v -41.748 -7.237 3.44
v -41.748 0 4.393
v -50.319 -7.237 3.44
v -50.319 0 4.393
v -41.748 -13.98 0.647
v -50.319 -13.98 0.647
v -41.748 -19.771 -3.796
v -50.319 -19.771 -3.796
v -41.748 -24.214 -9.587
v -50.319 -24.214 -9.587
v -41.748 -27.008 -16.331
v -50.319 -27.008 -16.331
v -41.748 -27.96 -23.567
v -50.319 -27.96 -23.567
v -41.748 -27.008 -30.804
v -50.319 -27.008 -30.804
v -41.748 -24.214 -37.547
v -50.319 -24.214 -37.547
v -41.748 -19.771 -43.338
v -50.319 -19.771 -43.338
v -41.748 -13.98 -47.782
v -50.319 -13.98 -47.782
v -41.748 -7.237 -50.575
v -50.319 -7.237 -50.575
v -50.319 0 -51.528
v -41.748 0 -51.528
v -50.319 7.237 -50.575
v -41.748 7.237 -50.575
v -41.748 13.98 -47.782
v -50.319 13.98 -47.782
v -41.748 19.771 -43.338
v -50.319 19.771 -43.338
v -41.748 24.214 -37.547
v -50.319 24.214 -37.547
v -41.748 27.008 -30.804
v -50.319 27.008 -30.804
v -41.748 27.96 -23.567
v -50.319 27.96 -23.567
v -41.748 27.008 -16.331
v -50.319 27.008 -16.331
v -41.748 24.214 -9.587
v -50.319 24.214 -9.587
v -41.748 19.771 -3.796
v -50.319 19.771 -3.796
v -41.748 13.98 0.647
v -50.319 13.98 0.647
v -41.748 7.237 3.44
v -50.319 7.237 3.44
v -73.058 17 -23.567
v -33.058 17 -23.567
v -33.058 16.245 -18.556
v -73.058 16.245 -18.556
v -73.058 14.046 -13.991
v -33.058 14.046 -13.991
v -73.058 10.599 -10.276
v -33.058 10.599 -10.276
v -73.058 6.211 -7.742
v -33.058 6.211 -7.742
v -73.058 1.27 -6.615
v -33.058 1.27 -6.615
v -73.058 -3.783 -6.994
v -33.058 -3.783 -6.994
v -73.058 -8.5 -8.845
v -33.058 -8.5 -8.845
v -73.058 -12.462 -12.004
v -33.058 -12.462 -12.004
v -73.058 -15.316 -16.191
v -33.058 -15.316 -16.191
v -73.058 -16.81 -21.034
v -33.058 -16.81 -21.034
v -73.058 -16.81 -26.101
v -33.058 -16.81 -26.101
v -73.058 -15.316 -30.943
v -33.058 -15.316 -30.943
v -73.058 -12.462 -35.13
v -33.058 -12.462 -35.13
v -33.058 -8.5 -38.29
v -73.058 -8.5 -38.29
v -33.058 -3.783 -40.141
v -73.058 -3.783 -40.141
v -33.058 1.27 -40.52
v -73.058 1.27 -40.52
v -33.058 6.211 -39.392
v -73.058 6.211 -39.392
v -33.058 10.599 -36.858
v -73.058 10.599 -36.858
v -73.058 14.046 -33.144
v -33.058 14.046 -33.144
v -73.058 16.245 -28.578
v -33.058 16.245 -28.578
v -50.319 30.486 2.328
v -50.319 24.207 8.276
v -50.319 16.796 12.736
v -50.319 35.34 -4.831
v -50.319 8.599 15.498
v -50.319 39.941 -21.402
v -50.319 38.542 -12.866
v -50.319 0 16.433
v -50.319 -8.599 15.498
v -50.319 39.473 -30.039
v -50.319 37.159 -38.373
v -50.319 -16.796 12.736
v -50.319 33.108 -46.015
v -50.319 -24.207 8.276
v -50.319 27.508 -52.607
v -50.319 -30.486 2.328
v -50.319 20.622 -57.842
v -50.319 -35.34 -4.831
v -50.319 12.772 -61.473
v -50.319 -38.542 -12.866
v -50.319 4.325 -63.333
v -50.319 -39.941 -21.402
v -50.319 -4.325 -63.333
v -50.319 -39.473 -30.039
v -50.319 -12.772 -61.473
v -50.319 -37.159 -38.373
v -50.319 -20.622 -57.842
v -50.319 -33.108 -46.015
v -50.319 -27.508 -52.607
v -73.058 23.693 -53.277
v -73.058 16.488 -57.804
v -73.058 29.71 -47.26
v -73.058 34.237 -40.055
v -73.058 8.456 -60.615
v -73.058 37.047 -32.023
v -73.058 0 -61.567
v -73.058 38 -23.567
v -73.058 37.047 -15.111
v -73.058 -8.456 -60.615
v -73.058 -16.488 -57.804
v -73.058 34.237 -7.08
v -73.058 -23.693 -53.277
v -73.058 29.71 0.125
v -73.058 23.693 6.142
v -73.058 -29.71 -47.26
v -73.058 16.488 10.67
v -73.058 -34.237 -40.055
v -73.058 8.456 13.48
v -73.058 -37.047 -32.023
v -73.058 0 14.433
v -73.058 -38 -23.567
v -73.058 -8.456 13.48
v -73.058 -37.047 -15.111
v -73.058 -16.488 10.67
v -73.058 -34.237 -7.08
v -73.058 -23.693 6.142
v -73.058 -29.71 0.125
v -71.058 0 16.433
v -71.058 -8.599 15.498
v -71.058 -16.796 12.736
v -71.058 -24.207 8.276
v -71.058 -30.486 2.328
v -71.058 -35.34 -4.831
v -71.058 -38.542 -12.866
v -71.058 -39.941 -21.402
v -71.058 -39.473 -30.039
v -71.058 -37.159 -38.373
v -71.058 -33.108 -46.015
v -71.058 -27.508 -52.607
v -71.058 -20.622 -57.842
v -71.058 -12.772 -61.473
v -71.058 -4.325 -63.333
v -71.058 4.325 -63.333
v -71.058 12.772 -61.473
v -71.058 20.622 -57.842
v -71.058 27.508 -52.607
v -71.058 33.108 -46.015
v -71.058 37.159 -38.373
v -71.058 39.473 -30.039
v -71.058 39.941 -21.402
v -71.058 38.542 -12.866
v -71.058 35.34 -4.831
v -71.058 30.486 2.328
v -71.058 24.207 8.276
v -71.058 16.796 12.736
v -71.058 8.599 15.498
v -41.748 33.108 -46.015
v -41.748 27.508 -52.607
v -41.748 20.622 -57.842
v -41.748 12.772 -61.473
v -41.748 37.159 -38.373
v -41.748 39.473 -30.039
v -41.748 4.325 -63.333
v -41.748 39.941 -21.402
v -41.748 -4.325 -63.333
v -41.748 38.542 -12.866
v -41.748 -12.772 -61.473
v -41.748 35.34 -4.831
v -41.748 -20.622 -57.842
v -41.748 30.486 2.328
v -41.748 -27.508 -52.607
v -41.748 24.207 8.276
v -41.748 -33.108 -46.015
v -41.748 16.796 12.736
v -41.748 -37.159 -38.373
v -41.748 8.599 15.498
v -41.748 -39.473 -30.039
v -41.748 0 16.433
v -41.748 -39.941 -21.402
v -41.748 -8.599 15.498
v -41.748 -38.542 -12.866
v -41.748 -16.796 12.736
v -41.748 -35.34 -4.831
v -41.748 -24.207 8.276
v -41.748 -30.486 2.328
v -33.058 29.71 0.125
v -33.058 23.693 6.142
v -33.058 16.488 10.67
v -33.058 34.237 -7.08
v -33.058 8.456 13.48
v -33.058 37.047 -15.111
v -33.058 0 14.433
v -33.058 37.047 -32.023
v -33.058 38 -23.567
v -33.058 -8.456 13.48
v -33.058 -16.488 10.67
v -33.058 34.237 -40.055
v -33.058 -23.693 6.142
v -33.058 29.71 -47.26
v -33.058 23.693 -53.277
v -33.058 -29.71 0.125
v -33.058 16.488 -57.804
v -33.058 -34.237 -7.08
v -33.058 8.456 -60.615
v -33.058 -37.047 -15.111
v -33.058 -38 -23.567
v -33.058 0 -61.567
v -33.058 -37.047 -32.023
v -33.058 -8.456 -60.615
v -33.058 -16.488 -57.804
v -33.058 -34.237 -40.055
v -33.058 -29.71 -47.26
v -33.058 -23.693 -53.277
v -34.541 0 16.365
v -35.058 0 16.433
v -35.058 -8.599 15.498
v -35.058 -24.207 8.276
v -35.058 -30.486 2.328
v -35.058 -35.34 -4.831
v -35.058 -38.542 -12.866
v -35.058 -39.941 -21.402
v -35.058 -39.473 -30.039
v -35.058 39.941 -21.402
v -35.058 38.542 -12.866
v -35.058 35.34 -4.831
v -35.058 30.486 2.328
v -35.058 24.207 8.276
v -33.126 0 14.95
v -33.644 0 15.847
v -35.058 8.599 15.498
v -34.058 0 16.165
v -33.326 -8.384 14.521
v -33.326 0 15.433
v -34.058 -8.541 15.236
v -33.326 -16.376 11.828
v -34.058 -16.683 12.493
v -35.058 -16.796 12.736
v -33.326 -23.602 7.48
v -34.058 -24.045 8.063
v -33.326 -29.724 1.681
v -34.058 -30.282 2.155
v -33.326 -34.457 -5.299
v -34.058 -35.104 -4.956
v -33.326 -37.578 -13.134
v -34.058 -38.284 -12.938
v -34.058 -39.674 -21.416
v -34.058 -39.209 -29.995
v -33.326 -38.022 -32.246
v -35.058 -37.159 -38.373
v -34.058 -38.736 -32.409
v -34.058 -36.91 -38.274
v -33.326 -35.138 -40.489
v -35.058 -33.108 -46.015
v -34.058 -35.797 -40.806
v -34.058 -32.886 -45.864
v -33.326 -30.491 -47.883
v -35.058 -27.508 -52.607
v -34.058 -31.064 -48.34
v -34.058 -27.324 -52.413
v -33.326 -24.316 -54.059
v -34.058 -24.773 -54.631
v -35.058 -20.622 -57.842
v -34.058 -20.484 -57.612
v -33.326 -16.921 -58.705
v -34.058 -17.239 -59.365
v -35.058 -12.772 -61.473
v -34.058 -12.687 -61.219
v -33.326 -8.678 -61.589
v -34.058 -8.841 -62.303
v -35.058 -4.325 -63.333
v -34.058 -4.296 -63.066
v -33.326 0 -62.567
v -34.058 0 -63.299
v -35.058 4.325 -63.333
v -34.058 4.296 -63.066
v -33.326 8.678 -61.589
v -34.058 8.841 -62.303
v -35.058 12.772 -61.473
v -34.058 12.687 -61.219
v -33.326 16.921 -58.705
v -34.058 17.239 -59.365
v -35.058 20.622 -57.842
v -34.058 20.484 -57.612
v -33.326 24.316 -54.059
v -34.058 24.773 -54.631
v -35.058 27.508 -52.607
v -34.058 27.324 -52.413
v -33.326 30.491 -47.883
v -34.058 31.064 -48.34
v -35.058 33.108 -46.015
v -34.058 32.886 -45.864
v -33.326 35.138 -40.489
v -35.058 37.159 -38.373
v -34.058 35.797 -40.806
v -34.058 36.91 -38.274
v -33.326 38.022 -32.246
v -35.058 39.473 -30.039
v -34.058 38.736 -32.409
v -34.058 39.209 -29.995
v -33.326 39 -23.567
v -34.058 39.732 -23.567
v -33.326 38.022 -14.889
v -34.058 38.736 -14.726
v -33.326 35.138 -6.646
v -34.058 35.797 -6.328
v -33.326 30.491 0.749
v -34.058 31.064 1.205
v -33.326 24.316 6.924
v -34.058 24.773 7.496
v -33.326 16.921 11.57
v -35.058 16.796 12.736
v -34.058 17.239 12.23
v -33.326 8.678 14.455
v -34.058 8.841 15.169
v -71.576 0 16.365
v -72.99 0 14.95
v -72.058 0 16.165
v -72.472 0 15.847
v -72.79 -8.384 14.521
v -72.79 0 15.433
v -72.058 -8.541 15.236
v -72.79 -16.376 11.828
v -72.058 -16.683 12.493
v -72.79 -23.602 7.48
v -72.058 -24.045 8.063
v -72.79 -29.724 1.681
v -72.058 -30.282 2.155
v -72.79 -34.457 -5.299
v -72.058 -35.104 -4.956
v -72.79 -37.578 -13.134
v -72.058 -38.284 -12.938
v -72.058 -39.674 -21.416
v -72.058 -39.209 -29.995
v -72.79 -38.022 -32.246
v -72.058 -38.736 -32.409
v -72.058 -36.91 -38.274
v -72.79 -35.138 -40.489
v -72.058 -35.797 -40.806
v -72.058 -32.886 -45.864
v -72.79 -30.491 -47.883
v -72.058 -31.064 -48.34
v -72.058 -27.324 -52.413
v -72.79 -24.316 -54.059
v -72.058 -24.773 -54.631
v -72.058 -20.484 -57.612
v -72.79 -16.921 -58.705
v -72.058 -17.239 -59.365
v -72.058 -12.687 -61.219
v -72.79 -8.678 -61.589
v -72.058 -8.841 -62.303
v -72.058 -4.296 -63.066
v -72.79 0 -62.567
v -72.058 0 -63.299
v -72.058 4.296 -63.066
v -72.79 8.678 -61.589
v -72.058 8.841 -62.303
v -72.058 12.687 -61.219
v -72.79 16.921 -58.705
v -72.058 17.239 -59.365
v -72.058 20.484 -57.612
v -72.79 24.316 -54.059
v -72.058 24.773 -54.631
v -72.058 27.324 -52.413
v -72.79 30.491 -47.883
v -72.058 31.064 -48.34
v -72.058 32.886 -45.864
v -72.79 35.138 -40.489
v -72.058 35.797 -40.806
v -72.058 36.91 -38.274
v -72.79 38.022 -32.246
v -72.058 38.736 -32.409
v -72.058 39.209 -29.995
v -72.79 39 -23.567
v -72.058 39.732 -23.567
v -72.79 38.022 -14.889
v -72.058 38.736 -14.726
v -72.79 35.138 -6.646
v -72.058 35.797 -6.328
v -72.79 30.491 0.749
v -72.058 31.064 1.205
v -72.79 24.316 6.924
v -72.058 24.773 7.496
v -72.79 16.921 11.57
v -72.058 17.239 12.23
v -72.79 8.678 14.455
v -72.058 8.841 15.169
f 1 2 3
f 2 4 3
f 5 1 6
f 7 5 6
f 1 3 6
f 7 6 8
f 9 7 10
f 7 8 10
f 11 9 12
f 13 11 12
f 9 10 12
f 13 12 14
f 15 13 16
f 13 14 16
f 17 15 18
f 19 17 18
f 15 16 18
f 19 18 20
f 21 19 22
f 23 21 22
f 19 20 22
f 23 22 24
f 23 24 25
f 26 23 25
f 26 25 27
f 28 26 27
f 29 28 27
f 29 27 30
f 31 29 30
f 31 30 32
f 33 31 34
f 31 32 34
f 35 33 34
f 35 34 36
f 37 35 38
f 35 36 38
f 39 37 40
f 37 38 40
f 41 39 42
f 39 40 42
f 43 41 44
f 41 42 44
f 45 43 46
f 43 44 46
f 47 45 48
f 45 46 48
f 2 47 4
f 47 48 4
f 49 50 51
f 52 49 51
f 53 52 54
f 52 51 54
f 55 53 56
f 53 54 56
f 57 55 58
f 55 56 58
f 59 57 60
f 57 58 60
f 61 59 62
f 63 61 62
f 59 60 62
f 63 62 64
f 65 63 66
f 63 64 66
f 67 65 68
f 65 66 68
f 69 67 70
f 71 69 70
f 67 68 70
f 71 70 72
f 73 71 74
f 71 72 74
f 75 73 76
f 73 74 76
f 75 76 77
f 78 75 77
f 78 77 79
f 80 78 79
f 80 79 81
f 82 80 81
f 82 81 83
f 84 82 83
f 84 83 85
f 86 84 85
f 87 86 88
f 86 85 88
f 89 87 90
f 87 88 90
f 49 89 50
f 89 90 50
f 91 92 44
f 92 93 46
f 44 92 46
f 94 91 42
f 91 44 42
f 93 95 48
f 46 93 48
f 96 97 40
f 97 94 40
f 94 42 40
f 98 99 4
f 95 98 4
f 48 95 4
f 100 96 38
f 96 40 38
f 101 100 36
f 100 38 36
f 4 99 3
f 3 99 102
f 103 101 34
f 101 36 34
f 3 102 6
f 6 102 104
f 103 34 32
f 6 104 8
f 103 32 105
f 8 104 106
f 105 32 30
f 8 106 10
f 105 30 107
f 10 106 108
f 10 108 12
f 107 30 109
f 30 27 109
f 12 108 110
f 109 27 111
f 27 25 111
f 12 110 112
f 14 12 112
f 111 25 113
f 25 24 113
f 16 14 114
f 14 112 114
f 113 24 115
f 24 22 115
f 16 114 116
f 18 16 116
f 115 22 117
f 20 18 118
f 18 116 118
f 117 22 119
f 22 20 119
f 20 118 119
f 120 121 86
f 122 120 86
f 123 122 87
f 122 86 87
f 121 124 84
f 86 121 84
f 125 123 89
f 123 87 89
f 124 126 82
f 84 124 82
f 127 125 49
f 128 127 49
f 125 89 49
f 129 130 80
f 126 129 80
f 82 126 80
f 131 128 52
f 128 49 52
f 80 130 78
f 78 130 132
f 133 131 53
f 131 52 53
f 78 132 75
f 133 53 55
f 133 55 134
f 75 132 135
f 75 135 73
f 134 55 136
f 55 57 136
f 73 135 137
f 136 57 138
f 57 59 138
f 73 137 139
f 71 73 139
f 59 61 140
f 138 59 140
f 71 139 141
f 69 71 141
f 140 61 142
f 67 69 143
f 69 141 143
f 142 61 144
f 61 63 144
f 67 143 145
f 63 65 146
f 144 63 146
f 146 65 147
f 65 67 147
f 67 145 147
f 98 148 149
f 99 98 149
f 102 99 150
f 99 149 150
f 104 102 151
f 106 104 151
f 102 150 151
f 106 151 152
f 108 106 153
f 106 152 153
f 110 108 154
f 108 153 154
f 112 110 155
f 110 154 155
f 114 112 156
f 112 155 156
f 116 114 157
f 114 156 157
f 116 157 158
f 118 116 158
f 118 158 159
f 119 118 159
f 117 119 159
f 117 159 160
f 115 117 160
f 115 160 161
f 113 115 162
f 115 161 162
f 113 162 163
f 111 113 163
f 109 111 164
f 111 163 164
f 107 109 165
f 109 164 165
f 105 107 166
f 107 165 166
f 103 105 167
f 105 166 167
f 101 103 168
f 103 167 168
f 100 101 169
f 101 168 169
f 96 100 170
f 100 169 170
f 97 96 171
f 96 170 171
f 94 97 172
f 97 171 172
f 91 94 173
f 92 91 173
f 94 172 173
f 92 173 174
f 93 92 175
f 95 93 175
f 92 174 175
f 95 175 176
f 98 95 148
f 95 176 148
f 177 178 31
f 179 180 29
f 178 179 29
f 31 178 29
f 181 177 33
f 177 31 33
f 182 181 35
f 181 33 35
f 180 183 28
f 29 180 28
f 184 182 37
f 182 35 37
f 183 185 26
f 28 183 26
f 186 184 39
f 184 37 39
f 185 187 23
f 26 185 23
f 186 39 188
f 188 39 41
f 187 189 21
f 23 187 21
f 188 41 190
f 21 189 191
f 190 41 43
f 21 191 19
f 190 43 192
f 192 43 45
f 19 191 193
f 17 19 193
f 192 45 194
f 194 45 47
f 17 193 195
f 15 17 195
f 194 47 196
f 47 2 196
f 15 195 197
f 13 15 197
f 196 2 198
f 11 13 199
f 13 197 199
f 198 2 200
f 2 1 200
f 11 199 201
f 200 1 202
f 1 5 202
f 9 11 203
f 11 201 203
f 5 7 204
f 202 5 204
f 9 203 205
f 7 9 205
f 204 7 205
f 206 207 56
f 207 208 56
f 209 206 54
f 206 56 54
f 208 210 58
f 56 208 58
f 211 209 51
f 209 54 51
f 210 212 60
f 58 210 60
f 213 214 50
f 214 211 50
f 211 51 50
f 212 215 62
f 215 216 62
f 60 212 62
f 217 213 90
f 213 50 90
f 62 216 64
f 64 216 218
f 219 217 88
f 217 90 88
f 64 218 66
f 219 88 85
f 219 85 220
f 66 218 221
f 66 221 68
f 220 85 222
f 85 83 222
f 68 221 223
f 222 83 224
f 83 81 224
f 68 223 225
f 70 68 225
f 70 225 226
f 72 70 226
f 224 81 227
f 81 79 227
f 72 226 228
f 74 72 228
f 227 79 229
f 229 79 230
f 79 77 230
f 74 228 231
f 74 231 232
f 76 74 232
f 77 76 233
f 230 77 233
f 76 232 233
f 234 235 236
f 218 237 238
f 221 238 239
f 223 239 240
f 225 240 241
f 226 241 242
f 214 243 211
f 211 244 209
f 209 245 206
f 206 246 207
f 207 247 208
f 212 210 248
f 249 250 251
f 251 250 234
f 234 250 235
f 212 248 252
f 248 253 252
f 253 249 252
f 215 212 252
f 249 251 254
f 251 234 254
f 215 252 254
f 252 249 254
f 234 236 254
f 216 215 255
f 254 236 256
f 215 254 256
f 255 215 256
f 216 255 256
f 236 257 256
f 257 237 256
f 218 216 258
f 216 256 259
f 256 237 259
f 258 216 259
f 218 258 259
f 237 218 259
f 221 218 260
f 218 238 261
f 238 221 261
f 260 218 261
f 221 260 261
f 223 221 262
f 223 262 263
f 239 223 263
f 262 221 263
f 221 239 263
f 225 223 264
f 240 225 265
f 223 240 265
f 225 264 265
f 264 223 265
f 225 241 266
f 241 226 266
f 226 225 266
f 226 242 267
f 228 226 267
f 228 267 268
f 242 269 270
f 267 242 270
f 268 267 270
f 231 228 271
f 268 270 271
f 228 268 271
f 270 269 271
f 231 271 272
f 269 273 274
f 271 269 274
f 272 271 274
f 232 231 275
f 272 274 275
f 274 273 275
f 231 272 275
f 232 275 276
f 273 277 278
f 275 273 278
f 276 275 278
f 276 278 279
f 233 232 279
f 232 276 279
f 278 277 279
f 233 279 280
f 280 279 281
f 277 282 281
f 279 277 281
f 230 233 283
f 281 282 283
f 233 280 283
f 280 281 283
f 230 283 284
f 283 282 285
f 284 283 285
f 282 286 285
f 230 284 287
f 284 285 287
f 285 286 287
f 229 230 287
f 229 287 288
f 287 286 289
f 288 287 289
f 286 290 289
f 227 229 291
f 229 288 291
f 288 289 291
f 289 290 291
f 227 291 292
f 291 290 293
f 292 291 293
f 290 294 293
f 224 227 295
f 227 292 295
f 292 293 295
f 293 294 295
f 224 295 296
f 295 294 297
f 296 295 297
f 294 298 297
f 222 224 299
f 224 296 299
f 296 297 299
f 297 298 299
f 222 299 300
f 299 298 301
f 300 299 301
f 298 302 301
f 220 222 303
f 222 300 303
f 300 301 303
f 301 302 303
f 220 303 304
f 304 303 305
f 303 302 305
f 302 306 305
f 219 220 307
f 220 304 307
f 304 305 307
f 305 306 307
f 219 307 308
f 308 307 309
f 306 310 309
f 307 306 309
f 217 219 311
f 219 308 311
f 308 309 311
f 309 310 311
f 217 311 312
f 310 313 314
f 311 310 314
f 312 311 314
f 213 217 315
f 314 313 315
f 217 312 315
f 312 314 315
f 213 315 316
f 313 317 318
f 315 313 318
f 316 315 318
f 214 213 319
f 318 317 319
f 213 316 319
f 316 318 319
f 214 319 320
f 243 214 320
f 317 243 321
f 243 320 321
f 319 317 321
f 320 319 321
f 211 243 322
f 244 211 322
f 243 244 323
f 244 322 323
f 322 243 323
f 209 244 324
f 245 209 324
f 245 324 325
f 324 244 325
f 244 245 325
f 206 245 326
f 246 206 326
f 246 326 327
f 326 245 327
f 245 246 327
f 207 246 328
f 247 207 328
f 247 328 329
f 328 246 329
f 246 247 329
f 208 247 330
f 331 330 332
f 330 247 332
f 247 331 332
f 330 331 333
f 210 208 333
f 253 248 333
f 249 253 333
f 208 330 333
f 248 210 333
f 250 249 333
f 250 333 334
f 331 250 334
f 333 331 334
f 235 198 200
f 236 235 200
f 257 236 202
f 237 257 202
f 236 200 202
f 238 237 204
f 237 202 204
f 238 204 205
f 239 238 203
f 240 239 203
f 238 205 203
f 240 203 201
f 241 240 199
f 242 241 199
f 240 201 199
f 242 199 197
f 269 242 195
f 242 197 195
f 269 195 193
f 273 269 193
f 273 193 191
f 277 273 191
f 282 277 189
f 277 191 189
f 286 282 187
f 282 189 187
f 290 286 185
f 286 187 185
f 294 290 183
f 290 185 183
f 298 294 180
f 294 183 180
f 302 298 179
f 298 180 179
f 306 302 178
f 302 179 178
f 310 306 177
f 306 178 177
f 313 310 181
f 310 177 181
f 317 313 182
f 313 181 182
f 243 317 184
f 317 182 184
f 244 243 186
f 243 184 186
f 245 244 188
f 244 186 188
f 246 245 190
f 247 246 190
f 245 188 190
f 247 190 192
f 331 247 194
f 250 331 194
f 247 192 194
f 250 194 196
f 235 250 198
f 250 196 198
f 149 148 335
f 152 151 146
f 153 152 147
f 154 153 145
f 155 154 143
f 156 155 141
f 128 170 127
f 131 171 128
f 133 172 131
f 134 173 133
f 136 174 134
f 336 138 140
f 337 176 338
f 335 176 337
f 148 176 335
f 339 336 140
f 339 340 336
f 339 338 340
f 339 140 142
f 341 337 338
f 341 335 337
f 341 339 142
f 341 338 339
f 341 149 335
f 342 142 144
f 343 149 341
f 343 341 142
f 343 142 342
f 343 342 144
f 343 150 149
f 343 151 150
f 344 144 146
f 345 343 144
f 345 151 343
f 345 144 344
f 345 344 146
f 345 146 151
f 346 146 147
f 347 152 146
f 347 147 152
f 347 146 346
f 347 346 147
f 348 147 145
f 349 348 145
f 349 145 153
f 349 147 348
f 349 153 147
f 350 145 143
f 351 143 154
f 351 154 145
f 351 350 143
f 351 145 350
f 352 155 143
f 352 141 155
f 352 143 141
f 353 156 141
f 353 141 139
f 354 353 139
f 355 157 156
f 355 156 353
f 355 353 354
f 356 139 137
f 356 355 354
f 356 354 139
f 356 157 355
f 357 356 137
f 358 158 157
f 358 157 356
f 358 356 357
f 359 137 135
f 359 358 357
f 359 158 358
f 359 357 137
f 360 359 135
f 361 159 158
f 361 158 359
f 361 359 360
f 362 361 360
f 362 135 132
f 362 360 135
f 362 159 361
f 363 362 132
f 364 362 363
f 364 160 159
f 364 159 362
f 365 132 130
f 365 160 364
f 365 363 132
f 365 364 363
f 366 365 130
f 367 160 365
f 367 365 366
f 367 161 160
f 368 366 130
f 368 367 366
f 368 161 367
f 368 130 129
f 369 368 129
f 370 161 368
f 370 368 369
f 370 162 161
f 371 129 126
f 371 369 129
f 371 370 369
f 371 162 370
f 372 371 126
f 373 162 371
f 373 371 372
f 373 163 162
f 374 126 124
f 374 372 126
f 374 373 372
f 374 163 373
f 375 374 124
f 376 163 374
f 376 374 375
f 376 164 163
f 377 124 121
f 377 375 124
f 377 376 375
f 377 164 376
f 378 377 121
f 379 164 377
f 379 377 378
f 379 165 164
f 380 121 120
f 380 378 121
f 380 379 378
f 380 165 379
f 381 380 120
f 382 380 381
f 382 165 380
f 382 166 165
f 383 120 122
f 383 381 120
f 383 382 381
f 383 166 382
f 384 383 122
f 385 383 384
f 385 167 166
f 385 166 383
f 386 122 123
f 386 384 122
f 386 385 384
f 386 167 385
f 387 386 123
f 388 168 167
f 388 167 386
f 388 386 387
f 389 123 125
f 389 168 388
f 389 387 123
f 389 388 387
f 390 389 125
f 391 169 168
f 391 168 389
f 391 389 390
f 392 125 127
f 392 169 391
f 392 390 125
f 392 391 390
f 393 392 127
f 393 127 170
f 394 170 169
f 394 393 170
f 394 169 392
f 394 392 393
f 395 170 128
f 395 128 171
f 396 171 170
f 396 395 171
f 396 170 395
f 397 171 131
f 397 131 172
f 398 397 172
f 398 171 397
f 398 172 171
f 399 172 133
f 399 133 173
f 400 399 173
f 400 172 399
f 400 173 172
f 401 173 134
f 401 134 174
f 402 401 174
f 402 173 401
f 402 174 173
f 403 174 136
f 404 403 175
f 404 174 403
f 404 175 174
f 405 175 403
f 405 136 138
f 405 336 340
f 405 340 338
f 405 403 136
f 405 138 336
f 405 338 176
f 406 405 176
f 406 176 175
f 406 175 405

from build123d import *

# Parameters (mm, degrees)
F2_R          = 17
F3_DEPTH      = 254
F3_TAPER      = -3
F3_DEPTH_BACK = 40
F4_R          = 2
F5_R          = 2


with BuildPart() as f1:
    # F0 (on Front) → F1 (revolve)
    with BuildSketch(Plane.XZ):
        Polygon((-73.0582855594, 16.432710439), (-73.0582855594, -23.567289561), (-33.0582855594, -23.567289561), (-33.0582855594, 16.432710439), (-41.7476892471, 16.432710439), (-41.7476892471, 4.3930672109), (-50.3192096949, 4.3930672109), (-50.3192096949, 16.432710439), align=None)
    revolve(axis=Axis((-53.0582855594, 0, -23.567289561), (1, 0, 0)))

    # F2 (on face) → F3 (cut, two sides)
    with BuildSketch(Plane.YZ.offset(-33.0582855594)) as f3_sk:
        with Locations((0, -23.567289561)):
            Circle(F2_R)
    extrude(amount=F3_DEPTH, taper=F3_TAPER, mode=Mode.SUBTRACT)
    extrude(f3_sk.sketch, amount=-F3_DEPTH_BACK, mode=Mode.SUBTRACT)

    # F4
    f4_edges = [f1.edges().sort_by_distance(p)[0] for p in [
        (-33.058286, 0, -63.56729),
    ]]
    fillet(f4_edges, radius=F4_R)

    # F5
    f5_edges = [f1.edges().sort_by_distance(p)[0] for p in [
        (-73.058286, 0, -63.56729),
    ]]
    fillet(f5_edges, radius=F5_R)


solid = f1.part
